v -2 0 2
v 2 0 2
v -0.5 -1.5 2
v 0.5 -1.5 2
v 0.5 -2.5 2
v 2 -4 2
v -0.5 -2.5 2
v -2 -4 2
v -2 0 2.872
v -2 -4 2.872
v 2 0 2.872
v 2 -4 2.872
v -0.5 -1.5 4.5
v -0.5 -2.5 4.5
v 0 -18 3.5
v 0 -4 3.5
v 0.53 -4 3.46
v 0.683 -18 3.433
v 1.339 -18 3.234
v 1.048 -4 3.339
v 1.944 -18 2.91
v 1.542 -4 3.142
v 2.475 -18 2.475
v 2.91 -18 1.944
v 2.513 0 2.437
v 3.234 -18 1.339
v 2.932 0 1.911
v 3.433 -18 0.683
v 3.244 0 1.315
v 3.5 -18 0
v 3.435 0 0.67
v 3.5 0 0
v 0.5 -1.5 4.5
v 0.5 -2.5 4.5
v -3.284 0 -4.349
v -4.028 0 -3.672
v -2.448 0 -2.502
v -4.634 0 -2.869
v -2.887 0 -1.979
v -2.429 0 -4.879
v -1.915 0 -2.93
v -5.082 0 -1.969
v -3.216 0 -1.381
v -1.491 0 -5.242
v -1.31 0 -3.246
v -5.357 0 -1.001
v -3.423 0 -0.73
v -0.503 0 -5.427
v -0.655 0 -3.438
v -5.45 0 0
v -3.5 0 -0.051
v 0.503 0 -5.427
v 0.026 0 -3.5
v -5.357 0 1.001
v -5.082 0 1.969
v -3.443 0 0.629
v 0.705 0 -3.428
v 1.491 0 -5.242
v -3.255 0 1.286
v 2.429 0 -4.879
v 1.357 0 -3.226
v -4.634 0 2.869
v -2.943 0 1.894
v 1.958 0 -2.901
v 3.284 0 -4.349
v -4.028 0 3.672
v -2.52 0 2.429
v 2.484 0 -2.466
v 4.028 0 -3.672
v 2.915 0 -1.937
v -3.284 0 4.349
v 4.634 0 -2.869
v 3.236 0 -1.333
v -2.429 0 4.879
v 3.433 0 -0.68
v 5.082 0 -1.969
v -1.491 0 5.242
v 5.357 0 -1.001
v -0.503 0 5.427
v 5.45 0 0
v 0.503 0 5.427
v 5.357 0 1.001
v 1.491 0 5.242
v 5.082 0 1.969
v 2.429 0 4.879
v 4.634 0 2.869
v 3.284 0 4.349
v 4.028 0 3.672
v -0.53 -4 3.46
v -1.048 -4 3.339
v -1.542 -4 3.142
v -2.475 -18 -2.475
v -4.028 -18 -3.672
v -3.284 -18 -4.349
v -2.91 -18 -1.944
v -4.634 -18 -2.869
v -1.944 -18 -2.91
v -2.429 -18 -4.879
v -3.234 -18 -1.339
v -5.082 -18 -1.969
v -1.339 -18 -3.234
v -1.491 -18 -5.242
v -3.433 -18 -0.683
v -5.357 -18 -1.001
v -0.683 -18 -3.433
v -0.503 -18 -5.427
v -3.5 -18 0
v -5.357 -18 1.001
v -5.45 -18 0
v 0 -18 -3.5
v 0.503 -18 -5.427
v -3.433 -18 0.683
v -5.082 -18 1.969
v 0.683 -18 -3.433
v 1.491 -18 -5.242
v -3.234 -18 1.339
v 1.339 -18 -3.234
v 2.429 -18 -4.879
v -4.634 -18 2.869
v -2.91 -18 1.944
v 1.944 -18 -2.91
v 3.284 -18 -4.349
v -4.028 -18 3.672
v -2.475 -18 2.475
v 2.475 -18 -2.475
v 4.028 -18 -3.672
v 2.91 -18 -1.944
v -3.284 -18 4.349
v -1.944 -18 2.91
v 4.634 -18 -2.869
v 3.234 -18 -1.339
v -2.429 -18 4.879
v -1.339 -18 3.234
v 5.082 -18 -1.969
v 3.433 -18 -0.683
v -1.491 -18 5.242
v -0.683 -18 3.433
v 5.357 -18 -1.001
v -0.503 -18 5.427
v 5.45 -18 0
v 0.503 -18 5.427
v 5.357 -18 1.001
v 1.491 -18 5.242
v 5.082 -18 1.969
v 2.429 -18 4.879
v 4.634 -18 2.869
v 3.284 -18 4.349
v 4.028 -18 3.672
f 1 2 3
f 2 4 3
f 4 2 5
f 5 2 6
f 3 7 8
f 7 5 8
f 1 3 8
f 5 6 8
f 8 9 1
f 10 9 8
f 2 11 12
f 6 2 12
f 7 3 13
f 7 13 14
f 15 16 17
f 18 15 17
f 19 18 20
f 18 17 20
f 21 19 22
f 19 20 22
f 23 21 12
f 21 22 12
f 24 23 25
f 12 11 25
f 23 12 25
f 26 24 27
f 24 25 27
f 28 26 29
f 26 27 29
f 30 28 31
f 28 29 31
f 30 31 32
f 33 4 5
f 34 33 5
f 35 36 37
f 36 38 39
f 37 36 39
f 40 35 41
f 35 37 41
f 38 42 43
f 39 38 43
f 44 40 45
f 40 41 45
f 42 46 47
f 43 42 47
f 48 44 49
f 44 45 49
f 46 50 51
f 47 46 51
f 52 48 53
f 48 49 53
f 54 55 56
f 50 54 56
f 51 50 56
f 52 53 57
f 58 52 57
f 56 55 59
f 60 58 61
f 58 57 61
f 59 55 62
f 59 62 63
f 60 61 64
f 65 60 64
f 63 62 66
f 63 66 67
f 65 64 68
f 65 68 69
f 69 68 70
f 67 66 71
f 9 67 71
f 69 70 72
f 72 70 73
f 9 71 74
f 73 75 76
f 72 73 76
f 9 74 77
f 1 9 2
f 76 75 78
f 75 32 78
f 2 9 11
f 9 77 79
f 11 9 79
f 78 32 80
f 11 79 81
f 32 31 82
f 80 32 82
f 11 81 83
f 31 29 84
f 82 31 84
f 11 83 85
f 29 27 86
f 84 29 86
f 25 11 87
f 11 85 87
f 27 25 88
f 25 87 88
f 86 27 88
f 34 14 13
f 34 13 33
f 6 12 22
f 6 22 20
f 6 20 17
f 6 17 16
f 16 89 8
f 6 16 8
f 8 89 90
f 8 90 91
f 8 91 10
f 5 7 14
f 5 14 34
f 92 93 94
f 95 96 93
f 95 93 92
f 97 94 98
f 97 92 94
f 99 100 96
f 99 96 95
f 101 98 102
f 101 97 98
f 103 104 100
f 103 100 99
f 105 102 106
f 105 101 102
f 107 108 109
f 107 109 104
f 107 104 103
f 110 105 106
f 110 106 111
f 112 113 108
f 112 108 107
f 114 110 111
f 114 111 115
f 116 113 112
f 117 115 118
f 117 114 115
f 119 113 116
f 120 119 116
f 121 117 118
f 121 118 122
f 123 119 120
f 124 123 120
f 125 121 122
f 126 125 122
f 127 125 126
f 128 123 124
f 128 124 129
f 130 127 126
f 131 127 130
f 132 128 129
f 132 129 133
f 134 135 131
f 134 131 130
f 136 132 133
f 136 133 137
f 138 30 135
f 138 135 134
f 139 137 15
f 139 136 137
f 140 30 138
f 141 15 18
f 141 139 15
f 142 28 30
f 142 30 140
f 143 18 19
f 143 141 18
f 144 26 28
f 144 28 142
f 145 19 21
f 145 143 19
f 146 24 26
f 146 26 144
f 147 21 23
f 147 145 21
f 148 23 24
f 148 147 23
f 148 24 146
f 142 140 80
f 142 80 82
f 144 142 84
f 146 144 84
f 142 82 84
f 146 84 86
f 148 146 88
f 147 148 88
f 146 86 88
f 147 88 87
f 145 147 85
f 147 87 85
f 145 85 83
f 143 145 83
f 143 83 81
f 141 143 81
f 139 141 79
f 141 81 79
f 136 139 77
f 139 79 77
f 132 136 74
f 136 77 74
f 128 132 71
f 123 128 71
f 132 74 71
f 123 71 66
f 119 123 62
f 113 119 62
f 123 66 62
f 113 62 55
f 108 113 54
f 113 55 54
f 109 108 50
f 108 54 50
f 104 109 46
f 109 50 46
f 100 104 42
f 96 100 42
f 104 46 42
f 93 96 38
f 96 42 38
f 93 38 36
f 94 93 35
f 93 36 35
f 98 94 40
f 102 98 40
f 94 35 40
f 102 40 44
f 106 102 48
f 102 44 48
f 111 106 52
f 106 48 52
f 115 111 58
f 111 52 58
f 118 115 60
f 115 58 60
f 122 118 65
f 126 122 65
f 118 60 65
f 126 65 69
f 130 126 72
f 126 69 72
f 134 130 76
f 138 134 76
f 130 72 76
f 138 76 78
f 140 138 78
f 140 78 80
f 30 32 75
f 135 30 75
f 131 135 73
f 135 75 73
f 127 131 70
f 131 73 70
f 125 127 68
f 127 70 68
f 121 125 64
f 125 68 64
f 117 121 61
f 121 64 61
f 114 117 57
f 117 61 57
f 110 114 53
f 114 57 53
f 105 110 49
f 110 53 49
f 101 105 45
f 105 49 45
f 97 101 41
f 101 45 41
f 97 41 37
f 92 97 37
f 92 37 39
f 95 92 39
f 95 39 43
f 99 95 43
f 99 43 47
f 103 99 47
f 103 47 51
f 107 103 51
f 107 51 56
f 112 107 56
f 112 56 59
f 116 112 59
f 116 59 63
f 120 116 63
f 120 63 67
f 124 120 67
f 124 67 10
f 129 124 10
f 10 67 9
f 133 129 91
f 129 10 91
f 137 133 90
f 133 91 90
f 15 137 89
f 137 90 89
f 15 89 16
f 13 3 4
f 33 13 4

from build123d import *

# Parameters (mm, degrees)
F0_R     = 5.45
F1_DEPTH = 18
F2_E2_W  = 4
F2_E2_H  = 4
F3_DEPTH = 1.5
F4_W     = 1
F4_H     = 1
F5_DEPTH = 2.5


with BuildPart() as f1:
    # F0 (on Front) → F1 (new body)
    with BuildSketch(Plane.XZ):
        Circle(F0_R)
        with BuildLine():
            ThreePointArc((0, 3.5), (2.4748737342, 2.4748737342), (3.5, 0))
            ThreePointArc((3.5, 0), (-2.4748737342, -2.4748737342), (0, 3.5))
        make_face(mode=Mode.SUBTRACT)
    extrude(amount=F1_DEPTH)

    # F2_E2 (on explicit) → F3 (join)
    with BuildSketch(Plane(origin=(2, 0, 3.5), x_dir=(-1, 0, 0), z_dir=(0, 0, 1))):
        with Locations((2, 2)):
            Rectangle(F2_E2_W, F2_E2_H)
    extrude(amount=-F3_DEPTH)

    # F4 (on face) → F5 (cut)
    with BuildSketch(Plane(origin=(0, 0, 2), x_dir=(1, 0, 0), z_dir=(0, 0, -1))):
        with Locations((0, 2)):
            Rectangle(F4_W, F4_H)
    extrude(amount=-F5_DEPTH, mode=Mode.SUBTRACT)


solid = f1.part
